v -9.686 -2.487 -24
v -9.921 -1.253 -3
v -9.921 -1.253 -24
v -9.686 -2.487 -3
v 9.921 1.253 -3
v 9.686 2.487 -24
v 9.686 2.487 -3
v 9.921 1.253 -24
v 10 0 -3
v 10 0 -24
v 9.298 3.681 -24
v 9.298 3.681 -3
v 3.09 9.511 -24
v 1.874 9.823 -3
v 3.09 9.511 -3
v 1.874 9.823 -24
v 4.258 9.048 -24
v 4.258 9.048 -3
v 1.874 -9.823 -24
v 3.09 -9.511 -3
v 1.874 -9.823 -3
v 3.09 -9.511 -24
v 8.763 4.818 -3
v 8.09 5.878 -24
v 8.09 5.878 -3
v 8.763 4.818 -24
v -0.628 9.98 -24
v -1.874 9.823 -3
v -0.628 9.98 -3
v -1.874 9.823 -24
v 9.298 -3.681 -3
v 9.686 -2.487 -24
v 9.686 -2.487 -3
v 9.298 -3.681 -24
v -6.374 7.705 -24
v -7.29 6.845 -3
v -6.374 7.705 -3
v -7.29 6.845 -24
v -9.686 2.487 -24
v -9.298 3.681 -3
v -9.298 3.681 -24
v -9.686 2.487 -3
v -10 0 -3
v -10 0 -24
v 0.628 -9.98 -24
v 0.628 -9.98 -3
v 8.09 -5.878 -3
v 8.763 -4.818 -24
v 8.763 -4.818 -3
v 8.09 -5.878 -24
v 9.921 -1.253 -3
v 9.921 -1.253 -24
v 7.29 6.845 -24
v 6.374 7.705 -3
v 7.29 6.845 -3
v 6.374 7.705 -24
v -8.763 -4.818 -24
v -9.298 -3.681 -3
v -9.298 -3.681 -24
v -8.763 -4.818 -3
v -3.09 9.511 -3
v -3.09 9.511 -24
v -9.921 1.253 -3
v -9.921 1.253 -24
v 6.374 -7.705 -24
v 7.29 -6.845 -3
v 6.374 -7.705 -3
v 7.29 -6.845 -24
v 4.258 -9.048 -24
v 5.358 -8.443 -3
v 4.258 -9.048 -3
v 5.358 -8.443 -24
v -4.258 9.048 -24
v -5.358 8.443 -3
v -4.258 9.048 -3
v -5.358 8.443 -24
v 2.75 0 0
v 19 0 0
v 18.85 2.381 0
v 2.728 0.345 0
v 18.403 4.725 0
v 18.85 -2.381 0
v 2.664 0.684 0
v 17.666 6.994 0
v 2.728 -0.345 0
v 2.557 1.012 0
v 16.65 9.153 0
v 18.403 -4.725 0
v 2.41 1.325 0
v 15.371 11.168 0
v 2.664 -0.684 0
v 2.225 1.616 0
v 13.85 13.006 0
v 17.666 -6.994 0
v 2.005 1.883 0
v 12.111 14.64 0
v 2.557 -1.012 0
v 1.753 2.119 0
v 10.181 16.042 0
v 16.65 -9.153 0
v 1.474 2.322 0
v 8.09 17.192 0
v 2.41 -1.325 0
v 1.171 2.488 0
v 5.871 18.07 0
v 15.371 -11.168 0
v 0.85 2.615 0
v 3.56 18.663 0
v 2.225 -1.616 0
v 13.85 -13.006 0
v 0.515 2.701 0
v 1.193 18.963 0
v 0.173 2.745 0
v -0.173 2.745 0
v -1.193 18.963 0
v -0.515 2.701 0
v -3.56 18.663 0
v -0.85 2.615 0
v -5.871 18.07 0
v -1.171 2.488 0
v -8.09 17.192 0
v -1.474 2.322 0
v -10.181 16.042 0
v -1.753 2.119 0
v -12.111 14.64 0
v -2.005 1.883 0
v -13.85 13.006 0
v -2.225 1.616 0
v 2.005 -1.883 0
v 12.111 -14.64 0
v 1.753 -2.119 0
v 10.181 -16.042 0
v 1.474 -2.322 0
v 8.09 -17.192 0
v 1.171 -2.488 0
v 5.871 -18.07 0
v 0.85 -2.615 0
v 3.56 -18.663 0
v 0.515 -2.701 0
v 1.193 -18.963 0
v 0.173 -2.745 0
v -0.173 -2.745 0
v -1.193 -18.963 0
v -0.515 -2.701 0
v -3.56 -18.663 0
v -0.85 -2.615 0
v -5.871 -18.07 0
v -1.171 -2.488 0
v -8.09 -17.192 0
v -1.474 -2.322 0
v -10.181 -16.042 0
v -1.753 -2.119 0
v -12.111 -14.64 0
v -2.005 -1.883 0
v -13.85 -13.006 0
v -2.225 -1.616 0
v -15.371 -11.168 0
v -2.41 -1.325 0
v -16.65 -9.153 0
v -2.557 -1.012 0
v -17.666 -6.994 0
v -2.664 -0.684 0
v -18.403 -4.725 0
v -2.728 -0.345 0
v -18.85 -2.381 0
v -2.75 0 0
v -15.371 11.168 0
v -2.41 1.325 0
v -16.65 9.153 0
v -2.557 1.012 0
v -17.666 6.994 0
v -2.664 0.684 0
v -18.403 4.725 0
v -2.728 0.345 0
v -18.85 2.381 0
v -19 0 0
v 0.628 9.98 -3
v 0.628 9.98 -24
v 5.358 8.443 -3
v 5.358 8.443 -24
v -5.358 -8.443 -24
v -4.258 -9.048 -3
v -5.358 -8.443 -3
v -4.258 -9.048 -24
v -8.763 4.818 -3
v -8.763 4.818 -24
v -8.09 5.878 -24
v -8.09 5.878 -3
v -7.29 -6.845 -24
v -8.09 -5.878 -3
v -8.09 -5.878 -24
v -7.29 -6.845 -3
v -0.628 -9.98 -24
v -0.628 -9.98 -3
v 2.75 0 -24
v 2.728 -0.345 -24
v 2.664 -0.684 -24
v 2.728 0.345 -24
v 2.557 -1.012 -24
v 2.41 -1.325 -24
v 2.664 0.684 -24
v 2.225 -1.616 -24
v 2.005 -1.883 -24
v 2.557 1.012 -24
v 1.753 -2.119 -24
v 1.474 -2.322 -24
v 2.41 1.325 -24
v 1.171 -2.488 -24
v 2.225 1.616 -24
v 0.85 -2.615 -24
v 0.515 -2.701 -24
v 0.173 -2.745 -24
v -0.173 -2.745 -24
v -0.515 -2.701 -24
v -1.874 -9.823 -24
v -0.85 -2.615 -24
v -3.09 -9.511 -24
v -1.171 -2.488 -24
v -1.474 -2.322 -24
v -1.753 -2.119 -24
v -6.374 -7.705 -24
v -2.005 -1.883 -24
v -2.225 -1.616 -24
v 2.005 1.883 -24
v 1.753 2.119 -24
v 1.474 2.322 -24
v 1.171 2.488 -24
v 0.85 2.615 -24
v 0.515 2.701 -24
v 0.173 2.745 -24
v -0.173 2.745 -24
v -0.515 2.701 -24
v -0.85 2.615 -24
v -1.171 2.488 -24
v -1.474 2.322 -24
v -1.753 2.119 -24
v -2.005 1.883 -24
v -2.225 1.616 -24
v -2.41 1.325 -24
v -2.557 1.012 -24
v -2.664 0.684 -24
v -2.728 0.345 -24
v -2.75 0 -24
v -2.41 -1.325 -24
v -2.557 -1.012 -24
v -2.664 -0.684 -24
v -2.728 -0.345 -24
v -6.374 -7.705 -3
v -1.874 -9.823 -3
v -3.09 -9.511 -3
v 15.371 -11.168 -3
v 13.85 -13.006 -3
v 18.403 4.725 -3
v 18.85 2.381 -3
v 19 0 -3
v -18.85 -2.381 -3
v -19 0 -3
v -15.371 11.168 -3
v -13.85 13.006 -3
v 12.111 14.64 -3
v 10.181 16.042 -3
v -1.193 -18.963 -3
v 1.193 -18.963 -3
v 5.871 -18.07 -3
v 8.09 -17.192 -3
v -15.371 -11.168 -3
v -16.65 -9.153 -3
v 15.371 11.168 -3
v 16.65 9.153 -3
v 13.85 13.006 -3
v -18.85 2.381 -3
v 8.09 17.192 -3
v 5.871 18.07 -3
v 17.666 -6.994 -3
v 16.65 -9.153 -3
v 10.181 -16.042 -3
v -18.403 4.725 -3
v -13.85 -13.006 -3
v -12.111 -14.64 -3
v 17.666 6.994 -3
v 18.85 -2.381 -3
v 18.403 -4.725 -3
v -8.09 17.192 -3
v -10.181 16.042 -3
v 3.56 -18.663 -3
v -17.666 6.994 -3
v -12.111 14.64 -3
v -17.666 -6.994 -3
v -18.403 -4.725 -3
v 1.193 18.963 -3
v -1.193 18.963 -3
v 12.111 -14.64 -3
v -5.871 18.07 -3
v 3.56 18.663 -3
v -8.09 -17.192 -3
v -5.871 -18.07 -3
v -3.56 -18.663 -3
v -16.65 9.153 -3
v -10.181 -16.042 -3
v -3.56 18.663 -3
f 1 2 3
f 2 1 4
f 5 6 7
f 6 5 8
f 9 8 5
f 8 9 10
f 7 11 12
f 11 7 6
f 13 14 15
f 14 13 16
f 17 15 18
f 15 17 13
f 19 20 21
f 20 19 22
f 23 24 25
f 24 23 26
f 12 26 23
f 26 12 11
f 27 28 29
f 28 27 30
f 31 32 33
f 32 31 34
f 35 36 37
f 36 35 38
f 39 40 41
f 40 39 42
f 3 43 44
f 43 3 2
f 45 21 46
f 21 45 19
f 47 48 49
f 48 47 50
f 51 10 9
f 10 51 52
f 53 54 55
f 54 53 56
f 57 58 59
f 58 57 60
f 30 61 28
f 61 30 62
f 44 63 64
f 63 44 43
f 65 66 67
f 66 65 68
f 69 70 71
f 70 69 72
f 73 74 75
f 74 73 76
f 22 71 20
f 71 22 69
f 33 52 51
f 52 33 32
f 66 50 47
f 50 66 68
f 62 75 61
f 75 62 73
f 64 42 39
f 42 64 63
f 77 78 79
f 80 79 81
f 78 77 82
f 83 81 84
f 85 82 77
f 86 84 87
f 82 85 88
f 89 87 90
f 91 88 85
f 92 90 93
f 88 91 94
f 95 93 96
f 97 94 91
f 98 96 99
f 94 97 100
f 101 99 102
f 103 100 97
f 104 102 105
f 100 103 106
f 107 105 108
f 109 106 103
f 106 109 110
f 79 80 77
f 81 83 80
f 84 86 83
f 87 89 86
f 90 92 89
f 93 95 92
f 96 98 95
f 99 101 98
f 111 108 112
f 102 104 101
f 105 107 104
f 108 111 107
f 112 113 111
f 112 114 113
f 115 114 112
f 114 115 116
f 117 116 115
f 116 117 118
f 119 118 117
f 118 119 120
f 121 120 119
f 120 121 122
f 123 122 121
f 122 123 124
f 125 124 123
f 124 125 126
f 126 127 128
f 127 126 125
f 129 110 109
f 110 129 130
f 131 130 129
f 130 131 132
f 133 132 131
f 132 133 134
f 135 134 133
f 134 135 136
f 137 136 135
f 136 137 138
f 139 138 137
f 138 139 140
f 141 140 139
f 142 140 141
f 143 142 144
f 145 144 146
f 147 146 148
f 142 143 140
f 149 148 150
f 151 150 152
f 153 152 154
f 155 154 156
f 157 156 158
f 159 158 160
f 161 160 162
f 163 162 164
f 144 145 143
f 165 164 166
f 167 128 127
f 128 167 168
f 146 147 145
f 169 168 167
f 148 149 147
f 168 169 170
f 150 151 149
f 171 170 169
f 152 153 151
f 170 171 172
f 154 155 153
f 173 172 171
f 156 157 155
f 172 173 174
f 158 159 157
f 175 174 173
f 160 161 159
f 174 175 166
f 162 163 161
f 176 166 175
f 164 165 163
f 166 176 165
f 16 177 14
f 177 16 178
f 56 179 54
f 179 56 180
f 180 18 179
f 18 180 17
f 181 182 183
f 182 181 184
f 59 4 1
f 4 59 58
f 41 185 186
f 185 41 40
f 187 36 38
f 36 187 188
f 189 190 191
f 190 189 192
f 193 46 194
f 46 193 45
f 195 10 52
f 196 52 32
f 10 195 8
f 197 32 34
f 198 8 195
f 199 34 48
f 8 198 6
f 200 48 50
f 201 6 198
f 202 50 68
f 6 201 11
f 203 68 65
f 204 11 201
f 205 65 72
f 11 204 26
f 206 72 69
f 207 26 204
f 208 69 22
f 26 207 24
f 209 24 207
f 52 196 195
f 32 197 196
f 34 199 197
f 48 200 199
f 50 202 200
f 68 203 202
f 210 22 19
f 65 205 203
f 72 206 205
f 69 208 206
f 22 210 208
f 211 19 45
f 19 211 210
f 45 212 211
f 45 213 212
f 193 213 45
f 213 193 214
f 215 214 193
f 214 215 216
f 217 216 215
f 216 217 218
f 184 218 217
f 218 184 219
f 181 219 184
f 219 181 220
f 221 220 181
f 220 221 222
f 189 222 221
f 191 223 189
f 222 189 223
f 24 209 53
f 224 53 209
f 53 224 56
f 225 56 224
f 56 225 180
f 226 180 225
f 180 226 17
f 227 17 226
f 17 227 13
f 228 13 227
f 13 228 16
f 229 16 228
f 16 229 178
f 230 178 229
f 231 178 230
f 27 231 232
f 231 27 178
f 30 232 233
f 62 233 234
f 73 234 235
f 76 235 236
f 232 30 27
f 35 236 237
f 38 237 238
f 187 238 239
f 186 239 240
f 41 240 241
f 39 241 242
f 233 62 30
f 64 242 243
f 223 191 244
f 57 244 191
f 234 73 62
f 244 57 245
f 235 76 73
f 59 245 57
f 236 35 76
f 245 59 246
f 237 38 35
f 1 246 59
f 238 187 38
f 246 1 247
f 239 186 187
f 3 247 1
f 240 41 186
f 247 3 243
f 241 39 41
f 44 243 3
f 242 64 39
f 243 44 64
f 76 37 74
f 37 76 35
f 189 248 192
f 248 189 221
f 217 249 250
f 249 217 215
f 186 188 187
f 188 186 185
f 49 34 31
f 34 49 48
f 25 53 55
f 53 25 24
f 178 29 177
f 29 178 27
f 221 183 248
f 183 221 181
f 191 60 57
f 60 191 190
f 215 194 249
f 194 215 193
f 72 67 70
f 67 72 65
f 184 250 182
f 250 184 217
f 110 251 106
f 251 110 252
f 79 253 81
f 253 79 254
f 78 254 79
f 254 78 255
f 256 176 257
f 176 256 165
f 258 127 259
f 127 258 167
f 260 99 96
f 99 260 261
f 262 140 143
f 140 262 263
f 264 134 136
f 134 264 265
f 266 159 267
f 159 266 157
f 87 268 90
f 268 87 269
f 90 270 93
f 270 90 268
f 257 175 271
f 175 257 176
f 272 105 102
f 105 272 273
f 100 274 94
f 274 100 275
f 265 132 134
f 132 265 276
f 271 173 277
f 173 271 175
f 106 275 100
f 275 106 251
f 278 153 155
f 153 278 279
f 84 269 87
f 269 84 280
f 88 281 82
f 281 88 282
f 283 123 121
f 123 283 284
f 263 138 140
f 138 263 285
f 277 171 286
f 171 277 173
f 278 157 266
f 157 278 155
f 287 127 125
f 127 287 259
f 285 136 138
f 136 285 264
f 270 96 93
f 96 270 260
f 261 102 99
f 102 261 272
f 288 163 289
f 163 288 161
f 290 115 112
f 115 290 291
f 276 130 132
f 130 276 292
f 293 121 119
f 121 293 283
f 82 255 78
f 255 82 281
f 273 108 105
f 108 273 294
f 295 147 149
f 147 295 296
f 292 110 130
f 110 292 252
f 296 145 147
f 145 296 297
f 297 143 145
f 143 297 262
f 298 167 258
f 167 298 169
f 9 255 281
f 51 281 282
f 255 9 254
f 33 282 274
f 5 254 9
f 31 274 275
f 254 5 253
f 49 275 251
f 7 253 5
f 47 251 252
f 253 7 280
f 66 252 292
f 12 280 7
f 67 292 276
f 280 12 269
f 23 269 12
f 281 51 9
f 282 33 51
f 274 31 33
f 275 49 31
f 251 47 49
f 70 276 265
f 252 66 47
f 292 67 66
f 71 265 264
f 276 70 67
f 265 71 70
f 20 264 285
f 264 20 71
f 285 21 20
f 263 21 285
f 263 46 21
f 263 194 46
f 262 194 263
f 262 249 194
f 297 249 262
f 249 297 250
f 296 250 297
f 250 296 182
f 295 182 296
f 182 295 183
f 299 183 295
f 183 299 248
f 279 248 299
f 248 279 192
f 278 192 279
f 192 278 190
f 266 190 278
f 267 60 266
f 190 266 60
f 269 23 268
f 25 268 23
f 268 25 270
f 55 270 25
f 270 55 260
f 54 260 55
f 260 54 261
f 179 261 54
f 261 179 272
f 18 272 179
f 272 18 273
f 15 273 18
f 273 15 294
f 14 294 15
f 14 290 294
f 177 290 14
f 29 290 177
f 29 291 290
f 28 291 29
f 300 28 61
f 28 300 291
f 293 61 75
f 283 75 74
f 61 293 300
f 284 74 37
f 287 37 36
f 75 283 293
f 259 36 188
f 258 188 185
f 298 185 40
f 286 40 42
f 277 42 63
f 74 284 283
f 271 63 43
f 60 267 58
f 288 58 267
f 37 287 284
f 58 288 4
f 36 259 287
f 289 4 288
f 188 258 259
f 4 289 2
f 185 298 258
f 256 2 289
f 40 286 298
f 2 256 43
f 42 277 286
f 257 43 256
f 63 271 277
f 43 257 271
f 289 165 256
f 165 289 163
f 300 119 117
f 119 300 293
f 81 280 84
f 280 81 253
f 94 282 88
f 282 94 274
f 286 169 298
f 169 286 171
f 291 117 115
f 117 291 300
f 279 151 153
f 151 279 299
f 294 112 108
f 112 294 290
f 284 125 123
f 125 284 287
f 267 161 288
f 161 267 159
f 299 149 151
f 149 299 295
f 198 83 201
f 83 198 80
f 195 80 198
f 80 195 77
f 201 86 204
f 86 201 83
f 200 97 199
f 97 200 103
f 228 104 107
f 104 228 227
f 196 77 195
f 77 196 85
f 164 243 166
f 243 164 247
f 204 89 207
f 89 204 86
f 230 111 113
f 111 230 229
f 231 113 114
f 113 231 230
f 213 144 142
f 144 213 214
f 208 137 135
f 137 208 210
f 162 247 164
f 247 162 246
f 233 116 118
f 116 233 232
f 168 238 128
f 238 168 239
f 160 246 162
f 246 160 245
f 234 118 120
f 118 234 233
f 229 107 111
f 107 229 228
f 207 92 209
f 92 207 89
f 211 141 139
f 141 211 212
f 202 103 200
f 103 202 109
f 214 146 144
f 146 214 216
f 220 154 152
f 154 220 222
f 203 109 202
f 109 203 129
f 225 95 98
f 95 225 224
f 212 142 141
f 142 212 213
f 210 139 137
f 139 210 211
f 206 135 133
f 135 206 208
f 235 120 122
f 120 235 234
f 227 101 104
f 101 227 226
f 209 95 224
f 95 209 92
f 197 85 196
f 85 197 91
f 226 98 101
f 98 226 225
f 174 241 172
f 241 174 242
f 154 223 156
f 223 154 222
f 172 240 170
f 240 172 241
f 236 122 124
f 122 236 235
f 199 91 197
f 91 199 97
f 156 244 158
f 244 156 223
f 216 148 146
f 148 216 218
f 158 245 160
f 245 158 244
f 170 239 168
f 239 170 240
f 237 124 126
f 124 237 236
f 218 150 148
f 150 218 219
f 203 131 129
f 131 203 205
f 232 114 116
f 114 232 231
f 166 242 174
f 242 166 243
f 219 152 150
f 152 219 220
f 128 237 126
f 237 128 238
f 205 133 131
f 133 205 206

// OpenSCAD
$fn = 50;


difference() {
	union() {
		translate(v = [0, 0, -24.0000000000]) {
			cylinder(h = 24, r = 10.0000000000);
		}
		translate(v = [0, 0, -3.0000000000]) {
			cylinder(h = 3, r = 19.0000000000);
		}
	}
	union() {
		#translate(v = [0, 0, -24]) {
			cylinder(h = 24, r = 2.7500000000);
		}
	}
}
